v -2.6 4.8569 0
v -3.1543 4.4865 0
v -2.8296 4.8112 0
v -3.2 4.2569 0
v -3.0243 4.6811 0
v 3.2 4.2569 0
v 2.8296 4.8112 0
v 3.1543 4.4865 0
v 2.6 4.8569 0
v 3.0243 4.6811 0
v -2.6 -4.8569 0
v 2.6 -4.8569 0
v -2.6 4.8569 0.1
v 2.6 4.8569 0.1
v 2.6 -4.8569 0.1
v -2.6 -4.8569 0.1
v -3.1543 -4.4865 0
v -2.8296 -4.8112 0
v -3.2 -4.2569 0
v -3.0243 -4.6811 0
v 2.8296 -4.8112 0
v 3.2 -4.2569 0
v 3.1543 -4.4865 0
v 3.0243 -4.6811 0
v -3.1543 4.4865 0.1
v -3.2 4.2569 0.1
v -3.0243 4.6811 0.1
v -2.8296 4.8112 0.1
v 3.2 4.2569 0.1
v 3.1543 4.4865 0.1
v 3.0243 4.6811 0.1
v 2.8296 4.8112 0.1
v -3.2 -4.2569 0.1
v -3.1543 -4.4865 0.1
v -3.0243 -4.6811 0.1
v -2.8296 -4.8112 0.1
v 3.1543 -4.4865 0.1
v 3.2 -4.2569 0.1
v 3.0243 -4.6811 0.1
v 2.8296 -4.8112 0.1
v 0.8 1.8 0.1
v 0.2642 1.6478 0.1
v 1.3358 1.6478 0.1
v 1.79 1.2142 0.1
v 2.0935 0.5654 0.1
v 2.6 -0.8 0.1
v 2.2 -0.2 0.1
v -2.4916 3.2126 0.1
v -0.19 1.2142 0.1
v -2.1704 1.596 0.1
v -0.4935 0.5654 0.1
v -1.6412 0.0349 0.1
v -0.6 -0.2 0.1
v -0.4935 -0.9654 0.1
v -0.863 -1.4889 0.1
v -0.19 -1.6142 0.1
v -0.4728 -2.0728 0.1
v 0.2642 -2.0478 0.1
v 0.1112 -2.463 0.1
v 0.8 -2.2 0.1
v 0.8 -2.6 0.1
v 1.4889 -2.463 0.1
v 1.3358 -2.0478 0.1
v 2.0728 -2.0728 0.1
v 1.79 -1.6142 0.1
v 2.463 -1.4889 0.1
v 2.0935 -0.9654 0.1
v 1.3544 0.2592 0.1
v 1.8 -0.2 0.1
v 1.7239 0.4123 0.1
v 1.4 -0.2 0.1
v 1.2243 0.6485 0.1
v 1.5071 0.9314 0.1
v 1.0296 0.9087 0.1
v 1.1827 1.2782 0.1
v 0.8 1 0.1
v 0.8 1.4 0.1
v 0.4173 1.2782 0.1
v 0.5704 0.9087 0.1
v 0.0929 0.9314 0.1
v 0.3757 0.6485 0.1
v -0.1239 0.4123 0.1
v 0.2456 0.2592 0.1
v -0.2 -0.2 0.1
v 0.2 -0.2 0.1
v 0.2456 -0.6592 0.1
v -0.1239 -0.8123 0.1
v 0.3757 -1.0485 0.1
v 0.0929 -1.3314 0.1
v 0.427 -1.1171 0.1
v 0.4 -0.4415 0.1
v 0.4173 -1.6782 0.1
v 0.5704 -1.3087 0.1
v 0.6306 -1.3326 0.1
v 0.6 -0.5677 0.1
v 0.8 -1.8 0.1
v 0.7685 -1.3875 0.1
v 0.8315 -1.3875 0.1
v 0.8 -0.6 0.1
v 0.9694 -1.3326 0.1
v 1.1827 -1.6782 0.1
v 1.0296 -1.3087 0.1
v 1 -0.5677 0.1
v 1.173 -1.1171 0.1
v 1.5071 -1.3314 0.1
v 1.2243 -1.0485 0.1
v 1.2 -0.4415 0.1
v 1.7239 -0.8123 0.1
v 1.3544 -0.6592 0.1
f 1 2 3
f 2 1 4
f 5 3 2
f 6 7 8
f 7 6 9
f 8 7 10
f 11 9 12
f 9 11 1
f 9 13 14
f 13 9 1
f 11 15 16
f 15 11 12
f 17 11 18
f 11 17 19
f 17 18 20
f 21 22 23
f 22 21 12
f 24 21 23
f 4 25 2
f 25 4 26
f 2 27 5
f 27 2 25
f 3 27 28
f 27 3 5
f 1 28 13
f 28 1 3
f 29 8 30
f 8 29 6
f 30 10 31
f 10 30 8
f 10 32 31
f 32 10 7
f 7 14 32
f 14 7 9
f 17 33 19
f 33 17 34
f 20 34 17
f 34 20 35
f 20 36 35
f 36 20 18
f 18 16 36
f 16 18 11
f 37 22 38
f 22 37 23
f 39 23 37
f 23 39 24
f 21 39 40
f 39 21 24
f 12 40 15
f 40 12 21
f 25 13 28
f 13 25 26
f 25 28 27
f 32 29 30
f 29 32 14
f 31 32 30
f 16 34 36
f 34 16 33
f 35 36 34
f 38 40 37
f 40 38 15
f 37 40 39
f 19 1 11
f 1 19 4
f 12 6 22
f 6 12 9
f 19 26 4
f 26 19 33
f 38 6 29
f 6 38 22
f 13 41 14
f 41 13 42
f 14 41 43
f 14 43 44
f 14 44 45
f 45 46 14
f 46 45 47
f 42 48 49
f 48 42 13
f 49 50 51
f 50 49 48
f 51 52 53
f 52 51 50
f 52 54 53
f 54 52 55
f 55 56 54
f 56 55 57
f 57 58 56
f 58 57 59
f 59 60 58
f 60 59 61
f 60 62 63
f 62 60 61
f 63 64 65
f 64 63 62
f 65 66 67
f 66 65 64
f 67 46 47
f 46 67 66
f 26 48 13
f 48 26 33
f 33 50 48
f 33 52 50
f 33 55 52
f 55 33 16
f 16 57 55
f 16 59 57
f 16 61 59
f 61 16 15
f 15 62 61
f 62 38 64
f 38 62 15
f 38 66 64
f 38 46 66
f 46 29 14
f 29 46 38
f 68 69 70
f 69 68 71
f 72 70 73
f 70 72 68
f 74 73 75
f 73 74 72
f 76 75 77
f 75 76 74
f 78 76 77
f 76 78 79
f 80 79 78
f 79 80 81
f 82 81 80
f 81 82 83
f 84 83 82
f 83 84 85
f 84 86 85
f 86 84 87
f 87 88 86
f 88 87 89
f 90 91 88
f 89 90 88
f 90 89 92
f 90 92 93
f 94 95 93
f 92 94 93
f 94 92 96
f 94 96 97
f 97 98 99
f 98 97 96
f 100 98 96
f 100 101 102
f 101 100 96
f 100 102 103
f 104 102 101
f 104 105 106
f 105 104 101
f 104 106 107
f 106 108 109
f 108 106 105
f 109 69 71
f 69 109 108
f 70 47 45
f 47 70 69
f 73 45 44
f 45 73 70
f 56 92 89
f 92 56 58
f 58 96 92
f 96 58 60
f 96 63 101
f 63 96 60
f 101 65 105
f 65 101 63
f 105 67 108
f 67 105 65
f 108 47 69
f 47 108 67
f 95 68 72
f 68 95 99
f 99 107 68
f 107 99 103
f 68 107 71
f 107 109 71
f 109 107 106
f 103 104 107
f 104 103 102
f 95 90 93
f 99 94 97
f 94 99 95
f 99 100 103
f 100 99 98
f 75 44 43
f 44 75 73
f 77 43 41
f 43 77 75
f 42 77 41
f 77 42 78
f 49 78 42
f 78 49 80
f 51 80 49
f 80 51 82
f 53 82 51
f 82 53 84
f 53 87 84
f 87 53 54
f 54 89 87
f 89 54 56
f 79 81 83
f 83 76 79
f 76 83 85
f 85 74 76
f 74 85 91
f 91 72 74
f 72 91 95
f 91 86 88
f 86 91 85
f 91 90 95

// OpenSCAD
// file: ../p/box3u12.scad
use <../lib.scad>
function ldraw_lib__box3u12() = [
// 0 Box with 3 Parallel Faces without Any Edges
// 0 Name: box3u12.dat
// 0 Author: J.C. Tchang [tchang]
// 0 !LDRAW_ORG Primitive UPDATE 2014-02
// 0 !LICENSE Licensed under CC BY 4.0 : see CAreadme.txt
// 
// 0 BFC CERTIFY CCW
  [0,"BFC","CERTIFY"],
  [0,"BFC","CCW"],
// 
// 0 !HISTORY 2014-12-23 [PTadmin] Official Update 2014-02
// 
// 
// 4 16 -1 1 1 1 1 1 1 1 -1 -1 1 -1
  [4,16,-1,1,1,1,1,1,1,1,-1,-1,1,-1],
// 4 16 -1 1 1 -1 0 1 1 0 1 1 1 1
  [4,16,-1,1,1,-1,0,1,1,0,1,1,1,1],
// 4 16 1 1 -1 1 0 -1 -1 0 -1 -1 1 -1
  [4,16,1,1,-1,1,0,-1,-1,0,-1,-1,1,-1],
];
module ldraw_lib__box3u12(step=0, col=false, unit=2/5, alt=false, line=0.2, solid=!$preview)
    makepoly(ldraw_lib__box3u12(), step=step, col=col, unit=unit, alt=alt, line=line, solid=solid);
ldraw_lib__box3u12(line=0.2);
// file: ../p/1-4cyli.scad
use <../lib.scad>
function ldraw_lib__1_4cyli() = [
// 0 Cylinder 0.25
// 0 Name: 1-4cyli.dat
// 0 Author: James Jessiman
// 0 !LDRAW_ORG Primitive UPDATE 2012-01
// 0 !LICENSE Licensed under CC BY 4.0 : see CAreadme.txt
// 
// 0 BFC CERTIFY CCW
  [0,"BFC","CERTIFY"],
  [0,"BFC","CCW"],
// 
// 0 !HISTORY 2002-03-23 [sbliss] Added BFC statement.
// 0 !HISTORY 2002-04-25 [PTadmin] Official Update 2002-02
// 0 !HISTORY 2007-06-22 [PTadmin] Header formatted for Contributor Agreement
// 0 !HISTORY 2008-07-01 [PTadmin] Official Update 2008-01
// 0 !HISTORY 2012-02-16 [Philo] Changed to CCW
// 0 !HISTORY 2012-03-30 [PTadmin] Official Update 2012-01
// 
// 
// 4 16 1 1 0 0.9239 1 0.3827 0.9239 0 0.3827 1 0 0
  [4,16,1,1,0,0.9239,1,0.3827,0.9239,0,0.3827,1,0,0],
// 5 24 1 0 0 1 1 0 0.9239 0 0.3827 1 0 -1
  [5,24,1,0,0,1,1,0,0.9239,0,0.3827,1,0,-1],
// 4 16 0.9239 1 0.3827 0.7071 1 0.7071 0.7071 0 0.7071 0.9239 0 0.3827
  [4,16,0.9239,1,0.3827,0.7071,1,0.7071,0.7071,0,0.7071,0.9239,0,0.3827],
// 5 24 0.9239 0 0.3827 0.9239 1 0.3827 0.7071 0 0.7071 1 0 0
  [5,24,0.9239,0,0.3827,0.9239,1,0.3827,0.7071,0,0.7071,1,0,0],
// 4 16 0.7071 1 0.7071 0.3827 1 0.9239 0.3827 0 0.9239 0.7071 0 0.7071
  [4,16,0.7071,1,0.7071,0.3827,1,0.9239,0.3827,0,0.9239,0.7071,0,0.7071],
// 5 24 0.7071 0 0.7071 0.7071 1 0.7071 0.3827 0 0.9239 0.9239 0 0.3827
  [5,24,0.7071,0,0.7071,0.7071,1,0.7071,0.3827,0,0.9239,0.9239,0,0.3827],
// 4 16 0.3827 1 0.9239 0 1 1 0 0 1 0.3827 0 0.9239
  [4,16,0.3827,1,0.9239,0,1,1,0,0,1,0.3827,0,0.9239],
// 5 24 0.3827 0 0.9239 0.3827 1 0.9239 0 0 1 0.7071 0 0.7071
  [5,24,0.3827,0,0.9239,0.3827,1,0.9239,0,0,1,0.7071,0,0.7071],
// 5 24 0 0 1 0 1 1 0.3827 0 0.9239 -1 0 1
  [5,24,0,0,1,0,1,1,0.3827,0,0.9239,-1,0,1],
];
module ldraw_lib__1_4cyli(step=0, col=false, unit=2/5, alt=false, line=0.2, solid=!$preview)
    makepoly(ldraw_lib__1_4cyli(), step=step, col=col, unit=unit, alt=alt, line=line, solid=solid);
ldraw_lib__1_4cyli(line=0.2);
// file: ../p/1-4chrd.scad
use <../lib.scad>
function ldraw_lib__1_4chrd() = [
// 0 Chord 0.25
// 0 Name: 1-4chrd.dat
// 0 Author: Max Martin Richter [MMR1988]
// 0 !LDRAW_ORG Primitive UPDATE 2023-05
// 0 !LICENSE Licensed under CC BY 4.0 : see CAreadme.txt
// 
// 0 BFC CERTIFY CCW
  [0,"BFC","CERTIFY"],
  [0,"BFC","CCW"],
// 
// 0 !HISTORY 2004-04-22 [PTadmin] Official Update 2004-02
// 0 !HISTORY 2007-10-09 [PTadmin] Header formatted for Contributor Agreement
// 0 !HISTORY 2008-07-01 [PTadmin] Official Update 2008-01
// 0 !HISTORY 2012-08-02 [MMR1988] Re-creation with PrimGen2 and Rectifier
// 0 !HISTORY 2012-08-09 [PTadmin] Official Update 2012-02
// 0 !HISTORY 2023-10-27 [OrionP] Change author to MMR1988 from hafhead
// 0 !HISTORY 2023-10-31 [OrionP] Official Update 2023-05
// 
// 4 16 0.9239 0 0.3827 0.3827 0 0.9239 0 0 1 1 0 0
  [4,16,0.9239,0,0.3827,0.3827,0,0.9239,0,0,1,1,0,0],
// 3 16 0.7071 0 0.7071 0.3827 0 0.9239 0.9239 0 0.3827
  [3,16,0.7071,0,0.7071,0.3827,0,0.9239,0.9239,0,0.3827],
];
module ldraw_lib__1_4chrd(step=0, col=false, unit=2/5, alt=false, line=0.2, solid=!$preview)
    makepoly(ldraw_lib__1_4chrd(), step=step, col=col, unit=unit, alt=alt, line=line, solid=solid);
ldraw_lib__1_4chrd(line=0.2);
// file: s/6148328ags02.scad
use <../../lib.scad>
function ldraw_lib__s__6148328ags02() = [
// 0 ~Sticker  1.8 x  0.8 with Black Headlamp on White Background Right - Headlamp
// 0 Name: s\6148328ags02.dat
// 0 Author: Massimo Maso [Sirio]
// 0 !LDRAW_ORG Subpart UPDATE 2024-01
// 0 !LICENSE Licensed under CC BY 4.0 : see CAreadme.txt
// 
// 0 BFC CERTIFY CCW
  [0,"BFC","CERTIFY"],
  [0,"BFC","CCW"],
// 
// 0 !HISTORY 2024-01-29 [OrionP] Official Update 2024-01
// 
// 
// 0 // Faces
// 0 // Black faces
// 
// 4 0 2.3098 0 1.5308 1.3859 0 1.1481 1.5 0 0 2.5 0 0
  [4,0,2.3098,0,1.5308,1.3859,0,1.1481,1.5,0,0,2.5,0,0],
// 4 0 2.3098 0 1.5308 1.7678 0 2.8284 1.0607 0 2.1213 1.3859 0 1.1481
  [4,0,2.3098,0,1.5308,1.7678,0,2.8284,1.0607,0,2.1213,1.3859,0,1.1481],
// 4 0 .9568 0 3.6956 .5741 0 2.7717 1.0607 0 2.1213 1.7678 0 2.8284
  [4,0,.9568,0,3.6956,.5741,0,2.7717,1.0607,0,2.1213,1.7678,0,2.8284],
// 4 0 .9568 0 3.6956 0 0 4 0 0 3 .5741 0 2.7717
  [4,0,.9568,0,3.6956,0,0,4,0,0,3,.5741,0,2.7717],
// 4 0 -.9568 0 3.6956 -.5741 0 2.7717 0 0 3 0 0 4
  [4,0,-.9568,0,3.6956,-.5741,0,2.7717,0,0,3,0,0,4],
// 4 0 -.9568 0 3.6956 -1.7678 0 2.8284 -1.0607 0 2.1213 -.5741 0 2.7717
  [4,0,-.9568,0,3.6956,-1.7678,0,2.8284,-1.0607,0,2.1213,-.5741,0,2.7717],
// 4 0 -2.3098 0 1.5308 -1.3859 0 1.1481 -1.0607 0 2.1213 -1.7678 0 2.8284
  [4,0,-2.3098,0,1.5308,-1.3859,0,1.1481,-1.0607,0,2.1213,-1.7678,0,2.8284],
// 4 0 -2.3098 0 1.5308 -2.5 0 0 -1.5 0 0 -1.3859 0 1.1481
  [4,0,-2.3098,0,1.5308,-2.5,0,0,-1.5,0,0,-1.3859,0,1.1481],
// 4 0 -2.3098 0 -1.5308 -1.3859 0 -1.1481 -1.5 0 0 -2.5 0 0
  [4,0,-2.3098,0,-1.5308,-1.3859,0,-1.1481,-1.5,0,0,-2.5,0,0],
// 4 0 -2.3098 0 -1.5308 -1.7678 0 -2.8284 -1.0607 0 -2.1213 -1.3859 0 -1.1481
  [4,0,-2.3098,0,-1.5308,-1.7678,0,-2.8284,-1.0607,0,-2.1213,-1.3859,0,-1.1481],
// 3 0 -.9324 0 -2.2927 -1 0 -.6038 -1.0607 0 -2.1213
  [3,0,-.9324,0,-2.2927,-1,0,-.6038,-1.0607,0,-2.1213],
// 4 0 -.9324 0 -2.2927 -1.0607 0 -2.1213 -1.7678 0 -2.8284 -.9568 0 -3.6956
  [4,0,-.9324,0,-2.2927,-1.0607,0,-2.1213,-1.7678,0,-2.8284,-.9568,0,-3.6956],
// 3 0 -.9324 0 -2.2927 -.9568 0 -3.6956 -.5741 0 -2.7717
  [3,0,-.9324,0,-2.2927,-.9568,0,-3.6956,-.5741,0,-2.7717],
// 3 0 -.4235 0 -2.8316 -.5 0 -.9192 -.5741 0 -2.7717
  [3,0,-.4235,0,-2.8316,-.5,0,-.9192,-.5741,0,-2.7717],
// 4 0 -.4235 0 -2.8316 -.5741 0 -2.7717 -.9568 0 -3.6956 0 0 -4
  [4,0,-.4235,0,-2.8316,-.5741,0,-2.7717,-.9568,0,-3.6956,0,0,-4],
// 3 0 -.4235 0 -2.8316 0 0 -4 -.0787 0 -2.9687
  [3,0,-.4235,0,-2.8316,0,0,-4,-.0787,0,-2.9687],
// 4 0 0 0 -4 .0787 0 -2.9687 0 0 -1 -.0787 0 -2.9687
  [4,0,0,0,-4,.0787,0,-2.9687,0,0,-1,-.0787,0,-2.9687],
// 3 0 .4235 0 -2.8316 .0787 0 -2.9687 0 0 -4
  [3,0,.4235,0,-2.8316,.0787,0,-2.9687,0,0,-4],
// 4 0 .4235 0 -2.8316 0 0 -4 .9568 0 -3.6956 .5741 0 -2.7717
  [4,0,.4235,0,-2.8316,0,0,-4,.9568,0,-3.6956,.5741,0,-2.7717],
// 3 0 .4235 0 -2.8316 .5741 0 -2.7717 .5 0 -.9192
  [3,0,.4235,0,-2.8316,.5741,0,-2.7717,.5,0,-.9192],
// 3 0 .9324 0 -2.2927 .5741 0 -2.7717 .9568 0 -3.6956
  [3,0,.9324,0,-2.2927,.5741,0,-2.7717,.9568,0,-3.6956],
// 4 0 .9324 0 -2.2927 .9568 0 -3.6956 1.7678 0 -2.8284 1.0607 0 -2.1213
  [4,0,.9324,0,-2.2927,.9568,0,-3.6956,1.7678,0,-2.8284,1.0607,0,-2.1213],
// 3 0 .9324 0 -2.2927 1.0607 0 -2.1213 1 0 -.6038
  [3,0,.9324,0,-2.2927,1.0607,0,-2.1213,1,0,-.6038],
// 4 0 2.3098 0 -1.5308 1.3859 0 -1.1481 1.0607 0 -2.1213 1.7678 0 -2.8284
  [4,0,2.3098,0,-1.5308,1.3859,0,-1.1481,1.0607,0,-2.1213,1.7678,0,-2.8284],
// 4 0 2.3098 0 -1.5308 2.5 0 0 1.5 0 0 1.3859 0 -1.1481
  [4,0,2.3098,0,-1.5308,2.5,0,0,1.5,0,0,1.3859,0,-1.1481],
// 0 // Dark grey faces - actually halftone of white ndis and black disc
// 4 72 2.3098 0 1.5308 2.5 0 0 3.5 0 0 3.2337 0 1.9135
  [4,72,2.3098,0,1.5308,2.5,0,0,3.5,0,0,3.2337,0,1.9135],
// 4 72 2.3098 0 1.5308 3.2337 0 1.9135 2.4749 0 3.5355 1.7678 0 2.8284
  [4,72,2.3098,0,1.5308,3.2337,0,1.9135,2.4749,0,3.5355,1.7678,0,2.8284],
// 4 72 -.9568 0 -3.6956 -1.7678 0 -2.8284 -2.4749 0 -3.5355 -1.3395 0 -4.6195
  [4,72,-.9568,0,-3.6956,-1.7678,0,-2.8284,-2.4749,0,-3.5355,-1.3395,0,-4.6195],
// 4 72 -.9568 0 -3.6956 -1.3395 0 -4.6195 0 0 -5 0 0 -4
  [4,72,-.9568,0,-3.6956,-1.3395,0,-4.6195,0,0,-5,0,0,-4],
// 4 72 .9568 0 -3.6956 0 0 -4 0 0 -5 1.3395 0 -4.6195
  [4,72,.9568,0,-3.6956,0,0,-4,0,0,-5,1.3395,0,-4.6195],
// 4 72 .9568 0 -3.6956 1.3395 0 -4.6195 2.4749 0 -3.5355 1.7678 0 -2.8284
  [4,72,.9568,0,-3.6956,1.3395,0,-4.6195,2.4749,0,-3.5355,1.7678,0,-2.8284],
// 4 72 2.3098 0 -1.5308 1.7678 0 -2.8284 2.4749 0 -3.5355 3.2337 0 -1.9135
  [4,72,2.3098,0,-1.5308,1.7678,0,-2.8284,2.4749,0,-3.5355,3.2337,0,-1.9135],
// 4 72 2.3098 0 -1.5308 3.2337 0 -1.9135 3.5 0 0 2.5 0 0
  [4,72,2.3098,0,-1.5308,3.2337,0,-1.9135,3.5,0,0,2.5,0,0],
// 4 72 1.3859 0 1.1481 1.0607 0 2.1213 -.5 0 -.9192 0 0 -1
  [4,72,1.3859,0,1.1481,1.0607,0,2.1213,-.5,0,-.9192,0,0,-1],
// 4 72 1.3859 0 1.1481 0 0 -1 .5 0 -.9192 1 0 -.6038
  [4,72,1.3859,0,1.1481,0,0,-1,.5,0,-.9192,1,0,-.6038],
// 3 72 1.3859 0 1.1481 1 0 -.6038 1.5 0 0
  [3,72,1.3859,0,1.1481,1,0,-.6038,1.5,0,0],
// 4 72 1 0 -.6038 1.0607 0 -2.1213 1.3859 0 -1.1481 1.5 0 0
  [4,72,1,0,-.6038,1.0607,0,-2.1213,1.3859,0,-1.1481,1.5,0,0],
// 4 72 1 0 -.6038 .5 0 -.9192 .5741 0 -2.7717 .9324 0 -2.2927
  [4,72,1,0,-.6038,.5,0,-.9192,.5741,0,-2.7717,.9324,0,-2.2927],
// 3 72 -.5 0 -.9192 -.9324 0 -2.2927 -.5741 0 -2.7717
  [3,72,-.5,0,-.9192,-.9324,0,-2.2927,-.5741,0,-2.7717],
// 4 72 -.5 0 -.9192 -.4235 0 -2.8316 -.0787 0 -2.9687 0 0 -1
  [4,72,-.5,0,-.9192,-.4235,0,-2.8316,-.0787,0,-2.9687,0,0,-1],
// 4 72 0 0 -1 .0787 0 -2.9687 .4235 0 -2.8316 .5 0 -.9192
  [4,72,0,0,-1,.0787,0,-2.9687,.4235,0,-2.8316,.5,0,-.9192],
// 0 // White faces
// 4 15 .9568 0 3.6956 1.7678 0 2.8284 2.4749 0 3.5355 1.3395 0 4.6195
  [4,15,.9568,0,3.6956,1.7678,0,2.8284,2.4749,0,3.5355,1.3395,0,4.6195],
// 4 15 .9568 0 3.6956 1.3395 0 4.6195 0 0 5 0 0 4
  [4,15,.9568,0,3.6956,1.3395,0,4.6195,0,0,5,0,0,4],
// 4 15 -.9568 0 3.6956 0 0 4 0 0 5 -1.3395 0 4.6195
  [4,15,-.9568,0,3.6956,0,0,4,0,0,5,-1.3395,0,4.6195],
// 4 15 -.9568 0 3.6956 -1.3395 0 4.6195 -2.4749 0 3.5355 -1.7678 0 2.8284
  [4,15,-.9568,0,3.6956,-1.3395,0,4.6195,-2.4749,0,3.5355,-1.7678,0,2.8284],
// 4 15 -2.3098 0 1.5308 -1.7678 0 2.8284 -2.4749 0 3.5355 -3.2337 0 1.9135
  [4,15,-2.3098,0,1.5308,-1.7678,0,2.8284,-2.4749,0,3.5355,-3.2337,0,1.9135],
// 4 15 -2.3098 0 1.5308 -3.2337 0 1.9135 -3.5 0 0 -2.5 0 0
  [4,15,-2.3098,0,1.5308,-3.2337,0,1.9135,-3.5,0,0,-2.5,0,0],
// 4 15 -2.3098 0 -1.5308 -2.5 0 0 -3.5 0 0 -3.2337 0 -1.9135
  [4,15,-2.3098,0,-1.5308,-2.5,0,0,-3.5,0,0,-3.2337,0,-1.9135],
// 4 15 -2.3098 0 -1.5308 -3.2337 0 -1.9135 -2.4749 0 -3.5355 -1.7678 0 -2.8284
  [4,15,-2.3098,0,-1.5308,-3.2337,0,-1.9135,-2.4749,0,-3.5355,-1.7678,0,-2.8284],
// 3 15 -.5741 0 2.7717 -1.0607 0 2.1213 -1.3859 0 1.1481
  [3,15,-.5741,0,2.7717,-1.0607,0,2.1213,-1.3859,0,1.1481],
// 4 15 -.5741 0 2.7717 -1.3859 0 1.1481 -1.5 0 0 0 0 3
  [4,15,-.5741,0,2.7717,-1.3859,0,1.1481,-1.5,0,0,0,0,3],
// 4 15 -1 0 -.6038 .5741 0 2.7717 0 0 3 -1.5 0 0
  [4,15,-1,0,-.6038,.5741,0,2.7717,0,0,3,-1.5,0,0],
// 4 15 -1 0 -.6038 -.5 0 -.9192 1.0607 0 2.1213 .5741 0 2.7717
  [4,15,-1,0,-.6038,-.5,0,-.9192,1.0607,0,2.1213,.5741,0,2.7717],
// 4 15 -1 0 -.6038 -1.5 0 0 -1.3859 0 -1.1481 -1.0607 0 -2.1213
  [4,15,-1,0,-.6038,-1.5,0,0,-1.3859,0,-1.1481,-1.0607,0,-2.1213],
// 3 15 -1 0 -.6038 -.9324 0 -2.2927 -.5 0 -.9192
  [3,15,-1,0,-.6038,-.9324,0,-2.2927,-.5,0,-.9192],
];
module ldraw_lib__s__6148328ags02(step=0, col=false, unit=2/5, alt=false, line=0.2, solid=!$preview)
    makepoly(ldraw_lib__s__6148328ags02(), step=step, col=col, unit=unit, alt=alt, line=line, solid=solid);
ldraw_lib__s__6148328ags02(line=0.2);
// file: s/6148328ags01.scad
use <../../lib.scad>
use <../../p/1-4chrd.scad>
use <../../p/1-4cyli.scad>
use <../../p/box3u12.scad>
function ldraw_lib__s__6148328ags01() = [
// 0 ~Sticker  1.8 x  0.8 with Black Headlamp on White Background Right - Common Part
// 0 Name: s\6148328ags01.dat
// 0 Author: Massimo Maso [Sirio]
// 0 !LDRAW_ORG Subpart UPDATE 2024-01
// 0 !LICENSE Licensed under CC BY 4.0 : see CAreadme.txt
// 
// 0 BFC CERTIFY CCW
  [0,"BFC","CERTIFY"],
  [0,"BFC","CCW"],
// 
// 0 !HISTORY 2024-01-29 [OrionP] Official Update 2024-01
// 
// 
// 0 // Primitives
// 
// 1 16 -6.5 0 10.6422 -1.5 0 0 0 -1 0 0 0 1.5 1-4chrd.dat
  [1,16,-6.5,0,10.6422,-1.5,0,0,0,-1,0,0,0,1.5, ldraw_lib__1_4chrd()],
// 1 16 6.5 0 10.6422 1.5 0 0 0 -1 0 0 0 1.5 1-4chrd.dat
  [1,16,6.5,0,10.6422,1.5,0,0,0,-1,0,0,0,1.5, ldraw_lib__1_4chrd()],
// 1 16 0 -.25 0 6.5 0 0 0 .25 0 0 0 12.1422 box3u12.dat
  [1,16,0,-.25,0,6.5,0,0,0,.25,0,0,0,12.1422, ldraw_lib__box3u12()],
// 1 16 -6.5 0 -10.6422 -1.5 0 0 0 -1 0 0 0 -1.5 1-4chrd.dat
  [1,16,-6.5,0,-10.6422,-1.5,0,0,0,-1,0,0,0,-1.5, ldraw_lib__1_4chrd()],
// 1 16 6.5 0 -10.6422 1.5 0 0 0 -1 0 0 0 -1.5 1-4chrd.dat
  [1,16,6.5,0,-10.6422,1.5,0,0,0,-1,0,0,0,-1.5, ldraw_lib__1_4chrd()],
// 1 16 -6.5 0 10.6422 -1.5 0 0 0 -.25 0 0 0 1.5 1-4cyli.dat
  [1,16,-6.5,0,10.6422,-1.5,0,0,0,-.25,0,0,0,1.5, ldraw_lib__1_4cyli()],
// 1 16 6.5 0 10.6422 1.5 0 0 0 -.25 0 0 0 1.5 1-4cyli.dat
  [1,16,6.5,0,10.6422,1.5,0,0,0,-.25,0,0,0,1.5, ldraw_lib__1_4cyli()],
// 1 16 -6.5 0 -10.6422 -1.5 0 0 0 -.25 0 0 0 -1.5 1-4cyli.dat
  [1,16,-6.5,0,-10.6422,-1.5,0,0,0,-.25,0,0,0,-1.5, ldraw_lib__1_4cyli()],
// 1 16 6.5 0 -10.6422 1.5 0 0 0 -.25 0 0 0 -1.5 1-4cyli.dat
  [1,16,6.5,0,-10.6422,1.5,0,0,0,-.25,0,0,0,-1.5, ldraw_lib__1_4cyli()],
// 1 15 -6.5 -.25 10.6422 -1.5 0 0 0 1 0 0 0 1.5 1-4chrd.dat
  [1,15,-6.5,-.25,10.6422,-1.5,0,0,0,1,0,0,0,1.5, ldraw_lib__1_4chrd()],
// 1 15 6.5 -.25 10.6422 1.5 0 0 0 1 0 0 0 1.5 1-4chrd.dat
  [1,15,6.5,-.25,10.6422,1.5,0,0,0,1,0,0,0,1.5, ldraw_lib__1_4chrd()],
// 1 15 -6.5 -.25 -10.6422 -1.5 0 0 0 1 0 0 0 -1.5 1-4chrd.dat
  [1,15,-6.5,-.25,-10.6422,-1.5,0,0,0,1,0,0,0,-1.5, ldraw_lib__1_4chrd()],
// 1 15 6.5 -.25 -10.6422 1.5 0 0 0 1 0 0 0 -1.5 1-4chrd.dat
  [1,15,6.5,-.25,-10.6422,1.5,0,0,0,1,0,0,0,-1.5, ldraw_lib__1_4chrd()],
// 0 // Bottom faces
// 4 16 -6.5 0 12.1422 -6.5 0 -12.1422 -8 0 -10.6422 -8 0 10.6422
  [4,16,-6.5,0,12.1422,-6.5,0,-12.1422,-8,0,-10.6422,-8,0,10.6422],
// 4 16 6.5 0 12.1422 8 0 10.6422 8 0 -10.6422 6.5 0 -12.1422
  [4,16,6.5,0,12.1422,8,0,10.6422,8,0,-10.6422,6.5,0,-12.1422],
// 0 // Lateral faces
// 4 16 -8 0 10.6422 -8 0 -10.6422 -8 -.25 -10.6422 -8 -.25 10.6422
  [4,16,-8,0,10.6422,-8,0,-10.6422,-8,-.25,-10.6422,-8,-.25,10.6422],
// 4 16 8 0 10.6422 8 -.25 10.6422 8 -.25 -10.6422 8 0 -10.6422
  [4,16,8,0,10.6422,8,-.25,10.6422,8,-.25,-10.6422,8,0,-10.6422],
// 0 // Top faces
// 0 // Black faces
// 4 0 -6.5 -.25 12.1422 .6605 -.25 4.1195 2 -.25 4.5 6.5 -.25 12.1422
  [4,0,-6.5,-.25,12.1422,.6605,-.25,4.1195,2,-.25,4.5,6.5,-.25,12.1422],
// 3 0 6.5 -.25 12.1422 2 -.25 4.5 3.3395 -.25 4.1195
  [3,0,6.5,-.25,12.1422,2,-.25,4.5,3.3395,-.25,4.1195],
// 3 0 6.5 -.25 12.1422 3.3395 -.25 4.1195 4.4749 -.25 3.0355
  [3,0,6.5,-.25,12.1422,3.3395,-.25,4.1195,4.4749,-.25,3.0355],
// 3 0 6.5 -.25 12.1422 4.4749 -.25 3.0355 5.2337 -.25 1.4135
  [3,0,6.5,-.25,12.1422,4.4749,-.25,3.0355,5.2337,-.25,1.4135],
// 4 0 6.5 -.25 12.1422 5.2337 -.25 1.4135 5.5 -.25 -.5 6.5 -.25 -2
  [4,0,6.5,-.25,12.1422,5.2337,-.25,1.4135,5.5,-.25,-.5,6.5,-.25,-2],
// 4 0 -.4749 -.25 3.0355 .6605 -.25 4.1195 -6.5 -.25 12.1422 -6.2291 -.25 8.0315
  [4,0,-.4749,-.25,3.0355,.6605,-.25,4.1195,-6.5,-.25,12.1422,-6.2291,-.25,8.0315],
// 4 0 -.4749 -.25 3.0355 -6.2291 -.25 8.0315 -5.4259 -.25 3.99 -1.2337 -.25 1.4135
  [4,0,-.4749,-.25,3.0355,-6.2291,-.25,8.0315,-5.4259,-.25,3.99,-1.2337,-.25,1.4135],
// 4 0 -1.5 -.25 -.5 -1.2337 -.25 1.4135 -5.4259 -.25 3.99 -4.1029 -.25 .0872
  [4,0,-1.5,-.25,-.5,-1.2337,-.25,1.4135,-5.4259,-.25,3.99,-4.1029,-.25,.0872],
// 4 0 -1.5 -.25 -.5 -4.1029 -.25 .0872 -2.1576 -.25 -3.7222 -1.2337 -.25 -2.4135
  [4,0,-1.5,-.25,-.5,-4.1029,-.25,.0872,-2.1576,-.25,-3.7222,-1.2337,-.25,-2.4135],
// 4 0 -.4749 -.25 -4.0355 -1.2337 -.25 -2.4135 -2.1576 -.25 -3.7222 -1.182 -.25 -5.182
  [4,0,-.4749,-.25,-4.0355,-1.2337,-.25,-2.4135,-2.1576,-.25,-3.7222,-1.182,-.25,-5.182],
// 4 0 -.4749 -.25 -4.0355 -1.182 -.25 -5.182 .2779 -.25 -6.1576 .6605 -.25 -5.1195
  [4,0,-.4749,-.25,-4.0355,-1.182,-.25,-5.182,.2779,-.25,-6.1576,.6605,-.25,-5.1195],
// 4 0 2 -.25 -5.5 .6605 -.25 -5.1195 .2779 -.25 -6.1576 2 -.25 -6.5
  [4,0,2,-.25,-5.5,.6605,-.25,-5.1195,.2779,-.25,-6.1576,2,-.25,-6.5],
// 4 0 2 -.25 -5.5 2 -.25 -6.5 3.7222 -.25 -6.1576 3.3395 -.25 -5.1195
  [4,0,2,-.25,-5.5,2,-.25,-6.5,3.7222,-.25,-6.1576,3.3395,-.25,-5.1195],
// 4 0 4.4749 -.25 -4.0355 3.3395 -.25 -5.1195 3.7222 -.25 -6.1576 5.182 -.25 -5.182
  [4,0,4.4749,-.25,-4.0355,3.3395,-.25,-5.1195,3.7222,-.25,-6.1576,5.182,-.25,-5.182],
// 4 0 4.4749 -.25 -4.0355 5.182 -.25 -5.182 6.1576 -.25 -3.7222 5.2337 -.25 -2.4135
  [4,0,4.4749,-.25,-4.0355,5.182,-.25,-5.182,6.1576,-.25,-3.7222,5.2337,-.25,-2.4135],
// 4 0 5.5 -.25 -.5 5.2337 -.25 -2.4135 6.1576 -.25 -3.7222 6.5 -.25 -2
  [4,0,5.5,-.25,-.5,5.2337,-.25,-2.4135,6.1576,-.25,-3.7222,6.5,-.25,-2],
// 0 // White faces
// 4 15 -8 -.25 -10.6422 -6.2291 -.25 8.0315 -6.5 -.25 12.1422 -8 -.25 10.6422
  [4,15,-8,-.25,-10.6422,-6.2291,-.25,8.0315,-6.5,-.25,12.1422,-8,-.25,10.6422],
// 3 15 -8 -.25 -10.6422 -5.4259 -.25 3.99 -6.2291 -.25 8.0315
  [3,15,-8,-.25,-10.6422,-5.4259,-.25,3.99,-6.2291,-.25,8.0315],
// 3 15 -8 -.25 -10.6422 -4.1029 -.25 .0872 -5.4259 -.25 3.99
  [3,15,-8,-.25,-10.6422,-4.1029,-.25,.0872,-5.4259,-.25,3.99],
// 4 15 -8 -.25 -10.6422 -6.5 -.25 -12.1422 -2.1576 -.25 -3.7222 -4.1029 -.25 .0872
  [4,15,-8,-.25,-10.6422,-6.5,-.25,-12.1422,-2.1576,-.25,-3.7222,-4.1029,-.25,.0872],
// 3 15 -6.5 -.25 -12.1422 -1.182 -.25 -5.182 -2.1576 -.25 -3.7222
  [3,15,-6.5,-.25,-12.1422,-1.182,-.25,-5.182,-2.1576,-.25,-3.7222],
// 3 15 -6.5 -.25 -12.1422 .2779 -.25 -6.1576 -1.182 -.25 -5.182
  [3,15,-6.5,-.25,-12.1422,.2779,-.25,-6.1576,-1.182,-.25,-5.182],
// 4 15 -6.5 -.25 -12.1422 6.5 -.25 -12.1422 2 -.25 -6.5 .2779 -.25 -6.1576
  [4,15,-6.5,-.25,-12.1422,6.5,-.25,-12.1422,2,-.25,-6.5,.2779,-.25,-6.1576],
// 3 15 6.5 -.25 -12.1422 3.7222 -.25 -6.1576 2 -.25 -6.5
  [3,15,6.5,-.25,-12.1422,3.7222,-.25,-6.1576,2,-.25,-6.5],
// 4 15 6.5 -.25 -12.1422 8 -.25 -10.6422 5.182 -.25 -5.182 3.7222 -.25 -6.1576
  [4,15,6.5,-.25,-12.1422,8,-.25,-10.6422,5.182,-.25,-5.182,3.7222,-.25,-6.1576],
// 3 15 8 -.25 -10.6422 6.1576 -.25 -3.7222 5.182 -.25 -5.182
  [3,15,8,-.25,-10.6422,6.1576,-.25,-3.7222,5.182,-.25,-5.182],
// 3 15 8 -.25 -10.6422 6.5 -.25 -2 6.1576 -.25 -3.7222
  [3,15,8,-.25,-10.6422,6.5,-.25,-2,6.1576,-.25,-3.7222],
// 4 15 8 -.25 -10.6422 8 -.25 10.6422 6.5 -.25 12.1422 6.5 -.25 -2
  [4,15,8,-.25,-10.6422,8,-.25,10.6422,6.5,-.25,12.1422,6.5,-.25,-2],
];
module ldraw_lib__s__6148328ags01(step=0, col=false, unit=2/5, alt=false, line=0.2, solid=!$preview)
    makepoly(ldraw_lib__s__6148328ags01(), step=step, col=col, unit=unit, alt=alt, line=line, solid=solid);
ldraw_lib__s__6148328ags01(line=0.2);
// main file
use <../lib.scad>
use <s/6148328ags01.scad>
use <s/6148328ags02.scad>
function ldraw_lib__6148328ag() = [
// 0 Sticker  1.8 x  0.8 with Black Headlamp on White Background Right (Needs Work)
// 0 Name: 6148328ag.dat
// 0 Author: Massimo Maso [Sirio]
// 0 !LDRAW_ORG Part UPDATE 2024-01
// 0 !LICENSE Licensed under CC BY 4.0 : see CAreadme.txt
// 
// 0 !HELP Needs work: halftone areas in the headlamp are simplified with dark grey faces
// 
// 0 BFC CERTIFY CCW
  [0,"BFC","CERTIFY"],
  [0,"BFC","CCW"],
// 
// 0 !KEYWORDS 917K, Bricklink 75876stk01, Brickowl 852010, Pit Lane, Porsche
// 0 !KEYWORDS Rebrickable 26357, set 75876, Speed Champions
// 
// 0 !HISTORY 2024-01-29 [OrionP] Official Update 2024-01
// 
// 
// 1 16 0 0 0 1 0 0 0 1 0 0 0 1 s\6148328ags01.dat
  [1,16,0,0,0,1,0,0,0,1,0,0,0,1, ldraw_lib__s__6148328ags01()],
// 1 16 2 -.25 -.5 1 0 0 0 1 0 0 0 1 s\6148328ags02.dat
  [1,16,2,-.25,-.5,1,0,0,0,1,0,0,0,1, ldraw_lib__s__6148328ags02()],
// 
];
module ldraw_lib__6148328ag(step=0, col=false, unit=2/5, alt=false, line=0.2, solid=!$preview)
    makepoly(ldraw_lib__6148328ag(), step=step, col=col, unit=unit, alt=alt, line=line, solid=solid);
ldraw_lib__6148328ag(line=0.2);
